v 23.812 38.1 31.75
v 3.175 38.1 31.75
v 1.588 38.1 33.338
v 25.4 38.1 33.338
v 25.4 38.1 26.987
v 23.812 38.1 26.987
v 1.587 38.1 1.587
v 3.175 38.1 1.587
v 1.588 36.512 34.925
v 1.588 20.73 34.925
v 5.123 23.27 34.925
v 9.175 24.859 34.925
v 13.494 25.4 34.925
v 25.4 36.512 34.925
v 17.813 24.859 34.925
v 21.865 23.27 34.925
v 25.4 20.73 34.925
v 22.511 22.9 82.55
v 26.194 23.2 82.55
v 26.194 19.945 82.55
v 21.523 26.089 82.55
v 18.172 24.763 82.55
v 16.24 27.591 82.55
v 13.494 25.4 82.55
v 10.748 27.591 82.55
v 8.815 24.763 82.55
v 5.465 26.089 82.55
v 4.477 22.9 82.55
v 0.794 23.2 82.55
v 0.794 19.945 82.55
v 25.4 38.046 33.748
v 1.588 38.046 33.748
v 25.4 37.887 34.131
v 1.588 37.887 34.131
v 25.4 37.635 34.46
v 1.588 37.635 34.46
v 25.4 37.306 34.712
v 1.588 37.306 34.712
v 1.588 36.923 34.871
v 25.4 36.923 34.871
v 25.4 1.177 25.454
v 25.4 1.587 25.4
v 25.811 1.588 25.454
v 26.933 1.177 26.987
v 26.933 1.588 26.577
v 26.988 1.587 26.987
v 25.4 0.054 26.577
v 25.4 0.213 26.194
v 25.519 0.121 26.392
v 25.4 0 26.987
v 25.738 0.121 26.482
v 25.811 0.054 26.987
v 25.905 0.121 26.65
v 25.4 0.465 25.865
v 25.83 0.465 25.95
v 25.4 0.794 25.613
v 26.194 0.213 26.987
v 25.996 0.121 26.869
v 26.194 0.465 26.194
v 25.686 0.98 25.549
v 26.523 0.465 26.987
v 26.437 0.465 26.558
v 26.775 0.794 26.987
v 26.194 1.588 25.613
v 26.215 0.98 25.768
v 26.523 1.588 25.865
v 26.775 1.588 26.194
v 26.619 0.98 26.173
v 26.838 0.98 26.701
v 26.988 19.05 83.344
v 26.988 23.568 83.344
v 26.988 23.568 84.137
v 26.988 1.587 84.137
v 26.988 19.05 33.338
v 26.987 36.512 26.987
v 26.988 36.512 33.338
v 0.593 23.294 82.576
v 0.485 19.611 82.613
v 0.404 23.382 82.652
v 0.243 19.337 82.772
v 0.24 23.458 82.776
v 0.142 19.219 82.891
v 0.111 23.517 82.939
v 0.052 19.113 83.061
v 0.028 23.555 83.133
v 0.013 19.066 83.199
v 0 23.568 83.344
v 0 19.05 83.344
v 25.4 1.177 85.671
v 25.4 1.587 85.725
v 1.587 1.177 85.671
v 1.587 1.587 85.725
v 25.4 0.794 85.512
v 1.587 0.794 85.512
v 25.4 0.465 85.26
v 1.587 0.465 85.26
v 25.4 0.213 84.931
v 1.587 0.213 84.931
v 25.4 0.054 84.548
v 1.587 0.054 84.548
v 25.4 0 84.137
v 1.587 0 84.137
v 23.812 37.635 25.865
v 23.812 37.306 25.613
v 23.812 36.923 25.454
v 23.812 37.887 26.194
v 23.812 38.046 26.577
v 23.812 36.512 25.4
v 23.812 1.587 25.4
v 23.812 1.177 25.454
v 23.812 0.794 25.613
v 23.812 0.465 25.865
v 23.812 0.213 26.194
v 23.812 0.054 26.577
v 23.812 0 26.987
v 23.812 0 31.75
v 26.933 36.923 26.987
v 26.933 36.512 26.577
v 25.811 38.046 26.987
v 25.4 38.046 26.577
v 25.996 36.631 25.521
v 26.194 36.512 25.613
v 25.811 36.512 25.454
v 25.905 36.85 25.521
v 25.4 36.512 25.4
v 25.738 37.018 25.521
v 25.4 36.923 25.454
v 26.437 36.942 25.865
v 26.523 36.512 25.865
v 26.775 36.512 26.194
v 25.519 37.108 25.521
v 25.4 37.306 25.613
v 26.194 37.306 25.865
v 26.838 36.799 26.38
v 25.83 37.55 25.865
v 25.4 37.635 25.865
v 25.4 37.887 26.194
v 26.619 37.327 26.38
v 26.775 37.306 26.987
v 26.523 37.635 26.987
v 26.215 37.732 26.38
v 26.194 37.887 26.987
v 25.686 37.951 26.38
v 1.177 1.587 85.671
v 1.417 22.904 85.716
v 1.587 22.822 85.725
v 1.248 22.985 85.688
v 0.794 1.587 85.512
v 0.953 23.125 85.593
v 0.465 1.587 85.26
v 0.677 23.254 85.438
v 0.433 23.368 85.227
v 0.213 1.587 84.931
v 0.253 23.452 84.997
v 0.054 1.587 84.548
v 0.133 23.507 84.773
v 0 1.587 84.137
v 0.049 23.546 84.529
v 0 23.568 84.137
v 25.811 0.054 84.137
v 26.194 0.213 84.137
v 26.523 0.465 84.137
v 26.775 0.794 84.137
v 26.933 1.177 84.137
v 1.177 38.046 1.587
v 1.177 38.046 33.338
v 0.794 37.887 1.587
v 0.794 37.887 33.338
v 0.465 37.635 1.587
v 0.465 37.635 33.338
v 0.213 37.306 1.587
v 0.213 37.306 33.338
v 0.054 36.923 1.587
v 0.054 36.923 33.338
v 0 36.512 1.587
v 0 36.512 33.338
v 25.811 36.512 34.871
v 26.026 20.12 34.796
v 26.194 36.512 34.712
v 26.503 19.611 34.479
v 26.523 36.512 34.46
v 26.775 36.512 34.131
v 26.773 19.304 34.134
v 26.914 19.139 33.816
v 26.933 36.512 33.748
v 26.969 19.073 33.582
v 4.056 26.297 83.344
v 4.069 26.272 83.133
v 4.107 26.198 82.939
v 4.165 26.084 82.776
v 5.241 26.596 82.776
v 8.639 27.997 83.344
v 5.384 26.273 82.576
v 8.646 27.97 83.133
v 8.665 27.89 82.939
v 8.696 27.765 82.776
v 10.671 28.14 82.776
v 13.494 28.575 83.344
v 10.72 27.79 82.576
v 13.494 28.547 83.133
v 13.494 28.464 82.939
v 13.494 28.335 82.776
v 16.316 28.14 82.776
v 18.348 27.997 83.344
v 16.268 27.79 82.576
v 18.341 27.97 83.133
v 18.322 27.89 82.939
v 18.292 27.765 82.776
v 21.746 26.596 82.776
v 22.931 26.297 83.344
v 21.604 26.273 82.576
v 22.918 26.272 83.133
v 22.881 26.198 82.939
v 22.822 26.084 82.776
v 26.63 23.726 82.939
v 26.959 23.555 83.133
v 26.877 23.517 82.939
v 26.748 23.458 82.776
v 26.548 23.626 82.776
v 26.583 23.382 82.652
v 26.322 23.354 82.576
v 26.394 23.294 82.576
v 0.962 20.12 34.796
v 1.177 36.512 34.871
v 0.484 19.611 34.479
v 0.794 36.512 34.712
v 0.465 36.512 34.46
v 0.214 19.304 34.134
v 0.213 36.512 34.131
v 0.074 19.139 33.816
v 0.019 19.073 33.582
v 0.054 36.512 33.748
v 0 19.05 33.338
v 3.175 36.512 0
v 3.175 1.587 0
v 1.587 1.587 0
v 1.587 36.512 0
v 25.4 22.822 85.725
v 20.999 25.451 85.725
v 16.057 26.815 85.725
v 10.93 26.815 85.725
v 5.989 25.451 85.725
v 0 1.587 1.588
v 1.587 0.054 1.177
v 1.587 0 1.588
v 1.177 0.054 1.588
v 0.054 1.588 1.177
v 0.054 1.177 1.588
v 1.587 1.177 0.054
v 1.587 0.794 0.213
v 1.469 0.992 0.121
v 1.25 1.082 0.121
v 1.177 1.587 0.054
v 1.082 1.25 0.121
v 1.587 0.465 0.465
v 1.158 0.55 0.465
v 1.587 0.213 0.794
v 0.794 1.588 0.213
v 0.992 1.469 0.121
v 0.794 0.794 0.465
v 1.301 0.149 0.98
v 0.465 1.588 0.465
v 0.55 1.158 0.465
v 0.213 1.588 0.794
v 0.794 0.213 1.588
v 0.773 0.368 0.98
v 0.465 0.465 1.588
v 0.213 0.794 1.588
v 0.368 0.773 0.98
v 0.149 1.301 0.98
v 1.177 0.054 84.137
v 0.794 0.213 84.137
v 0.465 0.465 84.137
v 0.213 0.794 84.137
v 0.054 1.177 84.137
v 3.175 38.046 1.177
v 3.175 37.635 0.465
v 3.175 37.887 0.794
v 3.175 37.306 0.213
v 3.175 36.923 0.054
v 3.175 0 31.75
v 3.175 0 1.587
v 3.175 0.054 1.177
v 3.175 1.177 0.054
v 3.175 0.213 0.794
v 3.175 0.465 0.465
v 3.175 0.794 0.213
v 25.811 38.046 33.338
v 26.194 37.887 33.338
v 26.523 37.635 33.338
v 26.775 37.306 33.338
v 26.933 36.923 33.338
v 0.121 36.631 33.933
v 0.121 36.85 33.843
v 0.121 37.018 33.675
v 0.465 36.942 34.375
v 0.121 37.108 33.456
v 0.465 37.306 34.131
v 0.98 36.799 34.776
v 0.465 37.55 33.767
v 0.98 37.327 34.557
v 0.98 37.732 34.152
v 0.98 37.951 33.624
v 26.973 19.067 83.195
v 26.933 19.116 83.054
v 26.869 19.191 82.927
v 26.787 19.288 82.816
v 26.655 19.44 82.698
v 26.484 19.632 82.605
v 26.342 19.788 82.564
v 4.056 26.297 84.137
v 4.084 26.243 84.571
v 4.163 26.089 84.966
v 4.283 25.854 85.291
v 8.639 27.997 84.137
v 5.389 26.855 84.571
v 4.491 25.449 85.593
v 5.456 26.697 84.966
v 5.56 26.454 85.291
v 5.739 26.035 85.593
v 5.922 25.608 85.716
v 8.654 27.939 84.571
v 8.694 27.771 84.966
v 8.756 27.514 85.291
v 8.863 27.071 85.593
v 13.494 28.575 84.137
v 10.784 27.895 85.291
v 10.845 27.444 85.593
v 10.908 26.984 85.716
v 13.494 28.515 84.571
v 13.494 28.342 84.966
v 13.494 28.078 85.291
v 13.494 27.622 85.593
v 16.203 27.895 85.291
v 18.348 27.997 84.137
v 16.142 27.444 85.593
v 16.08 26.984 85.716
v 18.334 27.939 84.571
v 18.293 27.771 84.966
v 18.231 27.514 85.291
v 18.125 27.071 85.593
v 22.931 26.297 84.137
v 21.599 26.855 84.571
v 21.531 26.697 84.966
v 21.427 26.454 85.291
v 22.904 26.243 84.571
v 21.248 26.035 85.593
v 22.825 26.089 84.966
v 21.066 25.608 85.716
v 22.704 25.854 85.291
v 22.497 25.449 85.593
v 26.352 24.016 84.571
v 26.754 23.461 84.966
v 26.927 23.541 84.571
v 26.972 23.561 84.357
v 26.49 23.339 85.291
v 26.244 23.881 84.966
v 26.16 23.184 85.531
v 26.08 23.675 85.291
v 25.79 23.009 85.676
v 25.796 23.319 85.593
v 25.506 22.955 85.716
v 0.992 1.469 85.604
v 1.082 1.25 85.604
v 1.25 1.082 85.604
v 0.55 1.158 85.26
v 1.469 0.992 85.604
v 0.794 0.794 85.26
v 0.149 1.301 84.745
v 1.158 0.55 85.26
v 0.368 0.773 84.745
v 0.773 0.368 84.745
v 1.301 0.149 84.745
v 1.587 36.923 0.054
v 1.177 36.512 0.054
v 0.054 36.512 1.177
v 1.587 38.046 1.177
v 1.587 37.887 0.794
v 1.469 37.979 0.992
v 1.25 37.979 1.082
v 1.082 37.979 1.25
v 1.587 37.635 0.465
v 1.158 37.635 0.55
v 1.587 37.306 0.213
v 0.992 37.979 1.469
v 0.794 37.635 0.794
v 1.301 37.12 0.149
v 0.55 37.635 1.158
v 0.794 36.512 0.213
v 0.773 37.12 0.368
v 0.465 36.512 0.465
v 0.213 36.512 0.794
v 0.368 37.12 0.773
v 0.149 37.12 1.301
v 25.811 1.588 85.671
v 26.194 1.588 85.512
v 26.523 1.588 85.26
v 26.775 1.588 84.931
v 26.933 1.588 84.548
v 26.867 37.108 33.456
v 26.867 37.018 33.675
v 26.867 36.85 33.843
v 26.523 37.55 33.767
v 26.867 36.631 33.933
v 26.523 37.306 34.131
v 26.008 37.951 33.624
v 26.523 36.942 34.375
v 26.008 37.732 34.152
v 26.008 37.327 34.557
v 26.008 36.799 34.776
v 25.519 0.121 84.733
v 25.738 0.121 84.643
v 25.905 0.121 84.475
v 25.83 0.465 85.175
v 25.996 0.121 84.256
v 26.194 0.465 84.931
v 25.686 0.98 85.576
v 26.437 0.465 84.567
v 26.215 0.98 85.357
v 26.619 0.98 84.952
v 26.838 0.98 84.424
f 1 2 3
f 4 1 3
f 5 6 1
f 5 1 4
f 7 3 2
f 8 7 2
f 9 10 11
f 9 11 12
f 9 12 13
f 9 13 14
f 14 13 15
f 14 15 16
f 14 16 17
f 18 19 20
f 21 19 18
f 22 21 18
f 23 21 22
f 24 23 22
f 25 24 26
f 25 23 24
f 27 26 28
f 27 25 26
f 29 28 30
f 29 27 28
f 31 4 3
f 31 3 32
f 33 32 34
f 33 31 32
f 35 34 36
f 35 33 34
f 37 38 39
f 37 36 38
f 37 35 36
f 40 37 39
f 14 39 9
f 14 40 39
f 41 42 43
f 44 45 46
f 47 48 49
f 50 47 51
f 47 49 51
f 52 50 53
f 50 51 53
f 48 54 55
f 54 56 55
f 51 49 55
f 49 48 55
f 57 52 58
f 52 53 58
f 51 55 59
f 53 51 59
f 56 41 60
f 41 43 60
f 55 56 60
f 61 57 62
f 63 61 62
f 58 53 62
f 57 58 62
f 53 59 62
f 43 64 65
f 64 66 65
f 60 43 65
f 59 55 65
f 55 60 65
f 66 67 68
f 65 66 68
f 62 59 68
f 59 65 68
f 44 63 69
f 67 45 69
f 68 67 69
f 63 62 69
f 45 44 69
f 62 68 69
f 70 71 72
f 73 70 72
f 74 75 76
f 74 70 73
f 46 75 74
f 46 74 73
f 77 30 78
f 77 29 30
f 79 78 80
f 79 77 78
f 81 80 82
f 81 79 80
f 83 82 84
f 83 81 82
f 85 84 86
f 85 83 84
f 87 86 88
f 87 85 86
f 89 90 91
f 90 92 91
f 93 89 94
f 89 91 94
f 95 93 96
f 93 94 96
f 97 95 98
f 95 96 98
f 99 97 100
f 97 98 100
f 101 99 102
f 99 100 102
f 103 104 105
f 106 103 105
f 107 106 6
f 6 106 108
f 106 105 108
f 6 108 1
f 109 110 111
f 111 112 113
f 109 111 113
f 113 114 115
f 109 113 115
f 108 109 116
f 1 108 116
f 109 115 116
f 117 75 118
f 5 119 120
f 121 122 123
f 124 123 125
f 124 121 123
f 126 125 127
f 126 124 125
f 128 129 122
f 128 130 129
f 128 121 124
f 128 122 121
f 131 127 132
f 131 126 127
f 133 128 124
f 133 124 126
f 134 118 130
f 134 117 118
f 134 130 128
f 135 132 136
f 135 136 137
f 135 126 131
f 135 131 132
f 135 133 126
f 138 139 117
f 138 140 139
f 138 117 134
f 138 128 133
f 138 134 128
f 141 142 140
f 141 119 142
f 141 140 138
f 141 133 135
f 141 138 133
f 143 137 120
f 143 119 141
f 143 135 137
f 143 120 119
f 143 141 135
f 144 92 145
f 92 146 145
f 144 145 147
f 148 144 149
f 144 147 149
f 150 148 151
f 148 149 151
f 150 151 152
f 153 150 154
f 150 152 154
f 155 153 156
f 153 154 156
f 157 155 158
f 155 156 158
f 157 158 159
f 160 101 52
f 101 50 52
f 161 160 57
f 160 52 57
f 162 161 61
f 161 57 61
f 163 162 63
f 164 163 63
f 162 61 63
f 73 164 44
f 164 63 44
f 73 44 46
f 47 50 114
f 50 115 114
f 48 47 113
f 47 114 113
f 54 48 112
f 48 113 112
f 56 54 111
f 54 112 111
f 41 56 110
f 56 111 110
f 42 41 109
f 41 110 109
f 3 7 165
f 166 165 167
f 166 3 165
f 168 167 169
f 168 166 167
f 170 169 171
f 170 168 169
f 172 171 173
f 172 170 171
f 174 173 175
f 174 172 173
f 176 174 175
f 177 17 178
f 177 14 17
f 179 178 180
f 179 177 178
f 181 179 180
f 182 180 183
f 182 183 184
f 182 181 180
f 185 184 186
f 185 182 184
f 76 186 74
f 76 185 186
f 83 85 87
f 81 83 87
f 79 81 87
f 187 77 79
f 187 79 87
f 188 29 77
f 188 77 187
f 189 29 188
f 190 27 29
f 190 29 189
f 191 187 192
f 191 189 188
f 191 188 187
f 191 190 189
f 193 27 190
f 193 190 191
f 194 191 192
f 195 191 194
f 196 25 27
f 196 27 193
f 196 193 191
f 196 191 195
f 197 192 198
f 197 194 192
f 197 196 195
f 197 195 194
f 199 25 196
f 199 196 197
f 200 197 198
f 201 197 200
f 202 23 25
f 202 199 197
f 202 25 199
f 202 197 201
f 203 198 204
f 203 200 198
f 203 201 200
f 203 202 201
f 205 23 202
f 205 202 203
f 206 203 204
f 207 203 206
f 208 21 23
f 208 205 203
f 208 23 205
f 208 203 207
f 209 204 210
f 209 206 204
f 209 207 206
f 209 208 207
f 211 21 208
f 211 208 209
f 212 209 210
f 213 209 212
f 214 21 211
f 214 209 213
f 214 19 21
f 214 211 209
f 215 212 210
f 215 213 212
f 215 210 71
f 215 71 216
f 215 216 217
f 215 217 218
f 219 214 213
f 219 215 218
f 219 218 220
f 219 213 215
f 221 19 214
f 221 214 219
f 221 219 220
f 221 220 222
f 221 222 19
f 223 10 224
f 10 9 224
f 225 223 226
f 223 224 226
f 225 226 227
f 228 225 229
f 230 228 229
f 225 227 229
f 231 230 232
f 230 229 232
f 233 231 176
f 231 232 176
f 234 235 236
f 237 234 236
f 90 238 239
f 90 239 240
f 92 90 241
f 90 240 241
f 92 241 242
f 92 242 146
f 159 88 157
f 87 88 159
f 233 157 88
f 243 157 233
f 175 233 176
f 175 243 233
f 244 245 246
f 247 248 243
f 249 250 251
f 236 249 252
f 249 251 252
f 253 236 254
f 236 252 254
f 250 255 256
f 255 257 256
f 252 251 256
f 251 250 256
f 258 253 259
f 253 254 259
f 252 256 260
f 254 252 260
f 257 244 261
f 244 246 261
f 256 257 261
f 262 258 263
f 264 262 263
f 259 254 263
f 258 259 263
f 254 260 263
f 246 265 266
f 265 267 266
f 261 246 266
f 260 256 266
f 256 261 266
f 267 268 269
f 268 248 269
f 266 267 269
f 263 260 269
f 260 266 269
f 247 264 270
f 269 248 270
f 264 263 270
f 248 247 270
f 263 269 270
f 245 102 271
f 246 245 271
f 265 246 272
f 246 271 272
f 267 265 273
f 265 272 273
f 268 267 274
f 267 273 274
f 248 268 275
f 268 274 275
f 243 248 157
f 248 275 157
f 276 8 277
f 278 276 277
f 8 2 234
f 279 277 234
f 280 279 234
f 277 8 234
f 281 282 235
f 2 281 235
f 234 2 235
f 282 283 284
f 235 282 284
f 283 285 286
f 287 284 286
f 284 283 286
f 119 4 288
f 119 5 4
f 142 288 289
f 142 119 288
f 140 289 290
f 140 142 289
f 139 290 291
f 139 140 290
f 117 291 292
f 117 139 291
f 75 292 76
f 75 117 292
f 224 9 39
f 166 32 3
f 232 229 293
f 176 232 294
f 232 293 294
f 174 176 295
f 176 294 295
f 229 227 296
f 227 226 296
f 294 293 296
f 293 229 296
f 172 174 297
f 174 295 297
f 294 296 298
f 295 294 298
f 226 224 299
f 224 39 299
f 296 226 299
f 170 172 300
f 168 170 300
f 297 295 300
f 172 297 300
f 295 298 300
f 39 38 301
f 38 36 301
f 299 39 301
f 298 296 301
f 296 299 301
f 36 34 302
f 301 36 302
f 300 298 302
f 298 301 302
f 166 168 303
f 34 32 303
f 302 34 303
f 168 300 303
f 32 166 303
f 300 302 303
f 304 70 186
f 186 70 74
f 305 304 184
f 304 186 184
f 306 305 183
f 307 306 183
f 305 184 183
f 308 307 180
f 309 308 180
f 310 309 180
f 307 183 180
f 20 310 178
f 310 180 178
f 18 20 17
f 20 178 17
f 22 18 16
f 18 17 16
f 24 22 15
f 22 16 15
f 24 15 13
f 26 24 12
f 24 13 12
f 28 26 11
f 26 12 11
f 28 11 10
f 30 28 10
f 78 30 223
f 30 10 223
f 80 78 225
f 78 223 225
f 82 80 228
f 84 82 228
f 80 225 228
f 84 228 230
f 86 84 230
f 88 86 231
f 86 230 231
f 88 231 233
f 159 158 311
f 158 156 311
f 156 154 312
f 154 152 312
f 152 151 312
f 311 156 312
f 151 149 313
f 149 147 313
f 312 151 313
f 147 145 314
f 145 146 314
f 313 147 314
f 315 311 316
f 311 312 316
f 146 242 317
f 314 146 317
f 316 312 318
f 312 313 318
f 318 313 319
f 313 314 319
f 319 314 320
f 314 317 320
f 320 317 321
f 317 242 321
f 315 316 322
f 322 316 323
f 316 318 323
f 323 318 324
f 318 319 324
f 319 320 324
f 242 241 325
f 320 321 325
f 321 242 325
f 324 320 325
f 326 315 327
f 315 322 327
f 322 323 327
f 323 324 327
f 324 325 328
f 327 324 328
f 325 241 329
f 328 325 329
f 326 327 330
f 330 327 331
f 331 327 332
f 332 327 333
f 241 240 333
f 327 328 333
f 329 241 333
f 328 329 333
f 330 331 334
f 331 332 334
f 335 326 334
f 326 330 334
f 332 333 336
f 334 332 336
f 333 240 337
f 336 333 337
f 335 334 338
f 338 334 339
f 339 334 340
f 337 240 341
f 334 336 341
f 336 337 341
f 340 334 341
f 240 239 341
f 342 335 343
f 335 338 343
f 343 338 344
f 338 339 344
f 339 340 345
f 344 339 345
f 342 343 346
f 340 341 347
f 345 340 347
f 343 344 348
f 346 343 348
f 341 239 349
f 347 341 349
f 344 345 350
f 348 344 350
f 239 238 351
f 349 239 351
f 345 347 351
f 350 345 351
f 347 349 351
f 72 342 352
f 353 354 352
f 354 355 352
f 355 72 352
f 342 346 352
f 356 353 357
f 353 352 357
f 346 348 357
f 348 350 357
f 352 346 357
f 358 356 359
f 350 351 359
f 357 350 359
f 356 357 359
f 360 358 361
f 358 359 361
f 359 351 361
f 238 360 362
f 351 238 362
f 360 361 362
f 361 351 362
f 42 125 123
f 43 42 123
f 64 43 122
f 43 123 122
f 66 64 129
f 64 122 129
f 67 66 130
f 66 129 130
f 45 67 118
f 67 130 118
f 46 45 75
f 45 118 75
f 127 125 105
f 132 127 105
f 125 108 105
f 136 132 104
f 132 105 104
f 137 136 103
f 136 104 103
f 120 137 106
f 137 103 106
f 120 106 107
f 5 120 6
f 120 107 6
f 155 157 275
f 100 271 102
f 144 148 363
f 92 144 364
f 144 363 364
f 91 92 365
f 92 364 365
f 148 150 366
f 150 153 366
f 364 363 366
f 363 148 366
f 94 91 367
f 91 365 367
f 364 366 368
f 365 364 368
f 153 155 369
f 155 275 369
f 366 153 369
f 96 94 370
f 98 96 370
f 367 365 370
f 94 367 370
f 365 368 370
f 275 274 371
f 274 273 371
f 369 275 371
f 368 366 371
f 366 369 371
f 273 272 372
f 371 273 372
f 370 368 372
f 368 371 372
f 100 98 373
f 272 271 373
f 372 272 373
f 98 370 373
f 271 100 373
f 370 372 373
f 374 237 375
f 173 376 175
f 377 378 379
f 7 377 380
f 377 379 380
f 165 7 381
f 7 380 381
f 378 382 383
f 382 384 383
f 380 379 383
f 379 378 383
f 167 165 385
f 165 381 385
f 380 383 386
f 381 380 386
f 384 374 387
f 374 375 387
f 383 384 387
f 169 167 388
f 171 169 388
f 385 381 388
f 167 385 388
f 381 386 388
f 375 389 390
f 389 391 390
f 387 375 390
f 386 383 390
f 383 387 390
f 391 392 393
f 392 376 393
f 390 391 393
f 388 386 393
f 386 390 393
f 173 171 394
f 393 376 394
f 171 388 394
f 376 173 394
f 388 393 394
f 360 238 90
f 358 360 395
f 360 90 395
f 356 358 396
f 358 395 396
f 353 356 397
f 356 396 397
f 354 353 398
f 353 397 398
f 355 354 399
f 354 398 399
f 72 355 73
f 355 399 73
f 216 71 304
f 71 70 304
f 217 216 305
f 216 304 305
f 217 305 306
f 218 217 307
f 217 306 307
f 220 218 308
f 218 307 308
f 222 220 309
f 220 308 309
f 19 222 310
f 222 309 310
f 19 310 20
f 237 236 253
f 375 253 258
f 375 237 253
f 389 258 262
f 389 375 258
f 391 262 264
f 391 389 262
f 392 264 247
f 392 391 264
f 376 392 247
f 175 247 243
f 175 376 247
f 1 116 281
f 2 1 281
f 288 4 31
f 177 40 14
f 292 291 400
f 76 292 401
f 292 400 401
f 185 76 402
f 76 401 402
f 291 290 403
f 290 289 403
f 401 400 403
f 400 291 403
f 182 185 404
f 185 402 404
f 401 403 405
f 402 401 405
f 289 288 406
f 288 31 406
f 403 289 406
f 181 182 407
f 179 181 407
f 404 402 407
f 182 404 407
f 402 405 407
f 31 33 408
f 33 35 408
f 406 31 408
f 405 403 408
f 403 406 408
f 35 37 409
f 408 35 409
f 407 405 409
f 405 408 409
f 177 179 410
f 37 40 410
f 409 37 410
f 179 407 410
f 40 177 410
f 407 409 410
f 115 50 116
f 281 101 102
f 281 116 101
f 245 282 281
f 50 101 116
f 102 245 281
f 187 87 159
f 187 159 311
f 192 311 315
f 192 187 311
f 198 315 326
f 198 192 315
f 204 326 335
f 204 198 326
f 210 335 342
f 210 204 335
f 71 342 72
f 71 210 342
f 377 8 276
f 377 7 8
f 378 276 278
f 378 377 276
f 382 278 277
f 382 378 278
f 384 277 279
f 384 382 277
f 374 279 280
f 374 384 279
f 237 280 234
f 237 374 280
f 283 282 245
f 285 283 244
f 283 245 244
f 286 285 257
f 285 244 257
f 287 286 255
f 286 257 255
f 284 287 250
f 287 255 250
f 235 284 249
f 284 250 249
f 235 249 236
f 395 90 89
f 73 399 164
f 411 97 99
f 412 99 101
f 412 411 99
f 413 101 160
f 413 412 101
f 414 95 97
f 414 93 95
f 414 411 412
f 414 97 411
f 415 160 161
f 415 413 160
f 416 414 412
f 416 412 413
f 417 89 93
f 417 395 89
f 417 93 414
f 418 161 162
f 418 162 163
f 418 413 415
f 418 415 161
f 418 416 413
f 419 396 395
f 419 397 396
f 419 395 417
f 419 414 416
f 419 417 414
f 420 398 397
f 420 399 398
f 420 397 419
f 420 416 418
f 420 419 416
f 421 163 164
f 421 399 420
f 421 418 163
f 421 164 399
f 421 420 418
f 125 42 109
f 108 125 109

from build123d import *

# Parameters (mm, degrees)
BOSS_EXTRUDE1_DEPTH = 38.1
BOSS_EXTRUDE2_DEPTH = 47.625
BOSS_EXTRUDE3_DEPTH = 3.175
FILLET1_R           = 1.5875
FILLET2_R           = 0.79375


with BuildPart() as part:
    # Sketch1 → Boss-Extrude1 (new body)
    with BuildSketch(Plane(origin=(0, 0, 0), x_dir=(1, 0, 0), z_dir=(0, 1, 0))):
        Polygon((0, 0), (0, -34.925), (26.9875, -34.925), (26.9875, -25.4), (23.8125, -25.4), (23.8125, -31.75), (3.175, -31.75), (3.175, 0), align=None)
    extrude(amount=BOSS_EXTRUDE1_DEPTH)

    # Sketch2 → Boss-Extrude2 (add)
    with BuildSketch(Plane.XY.offset(34.925)):
        with BuildLine():
            Line((0, 19.05), (0, 0))
            Line((0, 0), (26.9875, 0))
            Line((26.9875, 0), (26.9875, 19.05))
            ThreePointArc((26.9875, 19.05), (13.49375, 25.4), (0, 19.05))
        make_face()
    extrude(amount=BOSS_EXTRUDE2_DEPTH)

    # Sketch3 → Boss-Extrude3 (add)
    with BuildSketch(Plane.XY.offset(82.55)):
        with BuildLine():
            Line((0, 19.05), (0, 23.56829895))
            ThreePointArc((0, 23.56829895), (13.49375, 28.575), (26.9875, 23.56829895))
            Line((26.9875, 23.56829895), (26.9875, 19.05))
            Line((26.9875, 19.05), (26.9875, 0))
            Line((26.9875, 0), (0, 0))
            Line((0, 0), (0, 19.05))
        make_face()
    extrude(amount=BOSS_EXTRUDE3_DEPTH)

    # Fillet1
    fillet1_edges = [part.edges().sort_by_distance(p)[0] for p in [
        (13.49375, 38.1, 34.925),
        (0, 0, 42.8625),
        (1.5875, 0, 0),
        (26.9875, 38.1, 30.1625),
        (26.9875, 19.05, 25.4),
        (26.9875, 28.575, 34.925),
        (0, 28.575, 34.925),
        (0, 19.05, 0),
        (25.4, 38.1, 25.4),
        (26.9875, 11.784149475, 85.725),
        (13.49375, 28.575, 85.725),
        (0, 11.784149475, 85.725),
        (13.49375, 0, 85.725),
        (1.5875, 38.1, 0),
        (0, 38.1, 17.4625),
        (25.4, 0, 25.4),
        (26.9875, 0, 55.5625),
    ]]
    fillet(fillet1_edges, radius=FILLET1_R)

    # Fillet2
    fillet2_edges = [part.edges().sort_by_distance(p)[0] for p in [
        (26.9875, 21.309149475, 82.55),
        (13.49375, 28.575, 82.55),
        (0, 21.309149475, 82.55),
    ]]
    fillet(fillet2_edges, radius=FILLET2_R)


solid = part.part
